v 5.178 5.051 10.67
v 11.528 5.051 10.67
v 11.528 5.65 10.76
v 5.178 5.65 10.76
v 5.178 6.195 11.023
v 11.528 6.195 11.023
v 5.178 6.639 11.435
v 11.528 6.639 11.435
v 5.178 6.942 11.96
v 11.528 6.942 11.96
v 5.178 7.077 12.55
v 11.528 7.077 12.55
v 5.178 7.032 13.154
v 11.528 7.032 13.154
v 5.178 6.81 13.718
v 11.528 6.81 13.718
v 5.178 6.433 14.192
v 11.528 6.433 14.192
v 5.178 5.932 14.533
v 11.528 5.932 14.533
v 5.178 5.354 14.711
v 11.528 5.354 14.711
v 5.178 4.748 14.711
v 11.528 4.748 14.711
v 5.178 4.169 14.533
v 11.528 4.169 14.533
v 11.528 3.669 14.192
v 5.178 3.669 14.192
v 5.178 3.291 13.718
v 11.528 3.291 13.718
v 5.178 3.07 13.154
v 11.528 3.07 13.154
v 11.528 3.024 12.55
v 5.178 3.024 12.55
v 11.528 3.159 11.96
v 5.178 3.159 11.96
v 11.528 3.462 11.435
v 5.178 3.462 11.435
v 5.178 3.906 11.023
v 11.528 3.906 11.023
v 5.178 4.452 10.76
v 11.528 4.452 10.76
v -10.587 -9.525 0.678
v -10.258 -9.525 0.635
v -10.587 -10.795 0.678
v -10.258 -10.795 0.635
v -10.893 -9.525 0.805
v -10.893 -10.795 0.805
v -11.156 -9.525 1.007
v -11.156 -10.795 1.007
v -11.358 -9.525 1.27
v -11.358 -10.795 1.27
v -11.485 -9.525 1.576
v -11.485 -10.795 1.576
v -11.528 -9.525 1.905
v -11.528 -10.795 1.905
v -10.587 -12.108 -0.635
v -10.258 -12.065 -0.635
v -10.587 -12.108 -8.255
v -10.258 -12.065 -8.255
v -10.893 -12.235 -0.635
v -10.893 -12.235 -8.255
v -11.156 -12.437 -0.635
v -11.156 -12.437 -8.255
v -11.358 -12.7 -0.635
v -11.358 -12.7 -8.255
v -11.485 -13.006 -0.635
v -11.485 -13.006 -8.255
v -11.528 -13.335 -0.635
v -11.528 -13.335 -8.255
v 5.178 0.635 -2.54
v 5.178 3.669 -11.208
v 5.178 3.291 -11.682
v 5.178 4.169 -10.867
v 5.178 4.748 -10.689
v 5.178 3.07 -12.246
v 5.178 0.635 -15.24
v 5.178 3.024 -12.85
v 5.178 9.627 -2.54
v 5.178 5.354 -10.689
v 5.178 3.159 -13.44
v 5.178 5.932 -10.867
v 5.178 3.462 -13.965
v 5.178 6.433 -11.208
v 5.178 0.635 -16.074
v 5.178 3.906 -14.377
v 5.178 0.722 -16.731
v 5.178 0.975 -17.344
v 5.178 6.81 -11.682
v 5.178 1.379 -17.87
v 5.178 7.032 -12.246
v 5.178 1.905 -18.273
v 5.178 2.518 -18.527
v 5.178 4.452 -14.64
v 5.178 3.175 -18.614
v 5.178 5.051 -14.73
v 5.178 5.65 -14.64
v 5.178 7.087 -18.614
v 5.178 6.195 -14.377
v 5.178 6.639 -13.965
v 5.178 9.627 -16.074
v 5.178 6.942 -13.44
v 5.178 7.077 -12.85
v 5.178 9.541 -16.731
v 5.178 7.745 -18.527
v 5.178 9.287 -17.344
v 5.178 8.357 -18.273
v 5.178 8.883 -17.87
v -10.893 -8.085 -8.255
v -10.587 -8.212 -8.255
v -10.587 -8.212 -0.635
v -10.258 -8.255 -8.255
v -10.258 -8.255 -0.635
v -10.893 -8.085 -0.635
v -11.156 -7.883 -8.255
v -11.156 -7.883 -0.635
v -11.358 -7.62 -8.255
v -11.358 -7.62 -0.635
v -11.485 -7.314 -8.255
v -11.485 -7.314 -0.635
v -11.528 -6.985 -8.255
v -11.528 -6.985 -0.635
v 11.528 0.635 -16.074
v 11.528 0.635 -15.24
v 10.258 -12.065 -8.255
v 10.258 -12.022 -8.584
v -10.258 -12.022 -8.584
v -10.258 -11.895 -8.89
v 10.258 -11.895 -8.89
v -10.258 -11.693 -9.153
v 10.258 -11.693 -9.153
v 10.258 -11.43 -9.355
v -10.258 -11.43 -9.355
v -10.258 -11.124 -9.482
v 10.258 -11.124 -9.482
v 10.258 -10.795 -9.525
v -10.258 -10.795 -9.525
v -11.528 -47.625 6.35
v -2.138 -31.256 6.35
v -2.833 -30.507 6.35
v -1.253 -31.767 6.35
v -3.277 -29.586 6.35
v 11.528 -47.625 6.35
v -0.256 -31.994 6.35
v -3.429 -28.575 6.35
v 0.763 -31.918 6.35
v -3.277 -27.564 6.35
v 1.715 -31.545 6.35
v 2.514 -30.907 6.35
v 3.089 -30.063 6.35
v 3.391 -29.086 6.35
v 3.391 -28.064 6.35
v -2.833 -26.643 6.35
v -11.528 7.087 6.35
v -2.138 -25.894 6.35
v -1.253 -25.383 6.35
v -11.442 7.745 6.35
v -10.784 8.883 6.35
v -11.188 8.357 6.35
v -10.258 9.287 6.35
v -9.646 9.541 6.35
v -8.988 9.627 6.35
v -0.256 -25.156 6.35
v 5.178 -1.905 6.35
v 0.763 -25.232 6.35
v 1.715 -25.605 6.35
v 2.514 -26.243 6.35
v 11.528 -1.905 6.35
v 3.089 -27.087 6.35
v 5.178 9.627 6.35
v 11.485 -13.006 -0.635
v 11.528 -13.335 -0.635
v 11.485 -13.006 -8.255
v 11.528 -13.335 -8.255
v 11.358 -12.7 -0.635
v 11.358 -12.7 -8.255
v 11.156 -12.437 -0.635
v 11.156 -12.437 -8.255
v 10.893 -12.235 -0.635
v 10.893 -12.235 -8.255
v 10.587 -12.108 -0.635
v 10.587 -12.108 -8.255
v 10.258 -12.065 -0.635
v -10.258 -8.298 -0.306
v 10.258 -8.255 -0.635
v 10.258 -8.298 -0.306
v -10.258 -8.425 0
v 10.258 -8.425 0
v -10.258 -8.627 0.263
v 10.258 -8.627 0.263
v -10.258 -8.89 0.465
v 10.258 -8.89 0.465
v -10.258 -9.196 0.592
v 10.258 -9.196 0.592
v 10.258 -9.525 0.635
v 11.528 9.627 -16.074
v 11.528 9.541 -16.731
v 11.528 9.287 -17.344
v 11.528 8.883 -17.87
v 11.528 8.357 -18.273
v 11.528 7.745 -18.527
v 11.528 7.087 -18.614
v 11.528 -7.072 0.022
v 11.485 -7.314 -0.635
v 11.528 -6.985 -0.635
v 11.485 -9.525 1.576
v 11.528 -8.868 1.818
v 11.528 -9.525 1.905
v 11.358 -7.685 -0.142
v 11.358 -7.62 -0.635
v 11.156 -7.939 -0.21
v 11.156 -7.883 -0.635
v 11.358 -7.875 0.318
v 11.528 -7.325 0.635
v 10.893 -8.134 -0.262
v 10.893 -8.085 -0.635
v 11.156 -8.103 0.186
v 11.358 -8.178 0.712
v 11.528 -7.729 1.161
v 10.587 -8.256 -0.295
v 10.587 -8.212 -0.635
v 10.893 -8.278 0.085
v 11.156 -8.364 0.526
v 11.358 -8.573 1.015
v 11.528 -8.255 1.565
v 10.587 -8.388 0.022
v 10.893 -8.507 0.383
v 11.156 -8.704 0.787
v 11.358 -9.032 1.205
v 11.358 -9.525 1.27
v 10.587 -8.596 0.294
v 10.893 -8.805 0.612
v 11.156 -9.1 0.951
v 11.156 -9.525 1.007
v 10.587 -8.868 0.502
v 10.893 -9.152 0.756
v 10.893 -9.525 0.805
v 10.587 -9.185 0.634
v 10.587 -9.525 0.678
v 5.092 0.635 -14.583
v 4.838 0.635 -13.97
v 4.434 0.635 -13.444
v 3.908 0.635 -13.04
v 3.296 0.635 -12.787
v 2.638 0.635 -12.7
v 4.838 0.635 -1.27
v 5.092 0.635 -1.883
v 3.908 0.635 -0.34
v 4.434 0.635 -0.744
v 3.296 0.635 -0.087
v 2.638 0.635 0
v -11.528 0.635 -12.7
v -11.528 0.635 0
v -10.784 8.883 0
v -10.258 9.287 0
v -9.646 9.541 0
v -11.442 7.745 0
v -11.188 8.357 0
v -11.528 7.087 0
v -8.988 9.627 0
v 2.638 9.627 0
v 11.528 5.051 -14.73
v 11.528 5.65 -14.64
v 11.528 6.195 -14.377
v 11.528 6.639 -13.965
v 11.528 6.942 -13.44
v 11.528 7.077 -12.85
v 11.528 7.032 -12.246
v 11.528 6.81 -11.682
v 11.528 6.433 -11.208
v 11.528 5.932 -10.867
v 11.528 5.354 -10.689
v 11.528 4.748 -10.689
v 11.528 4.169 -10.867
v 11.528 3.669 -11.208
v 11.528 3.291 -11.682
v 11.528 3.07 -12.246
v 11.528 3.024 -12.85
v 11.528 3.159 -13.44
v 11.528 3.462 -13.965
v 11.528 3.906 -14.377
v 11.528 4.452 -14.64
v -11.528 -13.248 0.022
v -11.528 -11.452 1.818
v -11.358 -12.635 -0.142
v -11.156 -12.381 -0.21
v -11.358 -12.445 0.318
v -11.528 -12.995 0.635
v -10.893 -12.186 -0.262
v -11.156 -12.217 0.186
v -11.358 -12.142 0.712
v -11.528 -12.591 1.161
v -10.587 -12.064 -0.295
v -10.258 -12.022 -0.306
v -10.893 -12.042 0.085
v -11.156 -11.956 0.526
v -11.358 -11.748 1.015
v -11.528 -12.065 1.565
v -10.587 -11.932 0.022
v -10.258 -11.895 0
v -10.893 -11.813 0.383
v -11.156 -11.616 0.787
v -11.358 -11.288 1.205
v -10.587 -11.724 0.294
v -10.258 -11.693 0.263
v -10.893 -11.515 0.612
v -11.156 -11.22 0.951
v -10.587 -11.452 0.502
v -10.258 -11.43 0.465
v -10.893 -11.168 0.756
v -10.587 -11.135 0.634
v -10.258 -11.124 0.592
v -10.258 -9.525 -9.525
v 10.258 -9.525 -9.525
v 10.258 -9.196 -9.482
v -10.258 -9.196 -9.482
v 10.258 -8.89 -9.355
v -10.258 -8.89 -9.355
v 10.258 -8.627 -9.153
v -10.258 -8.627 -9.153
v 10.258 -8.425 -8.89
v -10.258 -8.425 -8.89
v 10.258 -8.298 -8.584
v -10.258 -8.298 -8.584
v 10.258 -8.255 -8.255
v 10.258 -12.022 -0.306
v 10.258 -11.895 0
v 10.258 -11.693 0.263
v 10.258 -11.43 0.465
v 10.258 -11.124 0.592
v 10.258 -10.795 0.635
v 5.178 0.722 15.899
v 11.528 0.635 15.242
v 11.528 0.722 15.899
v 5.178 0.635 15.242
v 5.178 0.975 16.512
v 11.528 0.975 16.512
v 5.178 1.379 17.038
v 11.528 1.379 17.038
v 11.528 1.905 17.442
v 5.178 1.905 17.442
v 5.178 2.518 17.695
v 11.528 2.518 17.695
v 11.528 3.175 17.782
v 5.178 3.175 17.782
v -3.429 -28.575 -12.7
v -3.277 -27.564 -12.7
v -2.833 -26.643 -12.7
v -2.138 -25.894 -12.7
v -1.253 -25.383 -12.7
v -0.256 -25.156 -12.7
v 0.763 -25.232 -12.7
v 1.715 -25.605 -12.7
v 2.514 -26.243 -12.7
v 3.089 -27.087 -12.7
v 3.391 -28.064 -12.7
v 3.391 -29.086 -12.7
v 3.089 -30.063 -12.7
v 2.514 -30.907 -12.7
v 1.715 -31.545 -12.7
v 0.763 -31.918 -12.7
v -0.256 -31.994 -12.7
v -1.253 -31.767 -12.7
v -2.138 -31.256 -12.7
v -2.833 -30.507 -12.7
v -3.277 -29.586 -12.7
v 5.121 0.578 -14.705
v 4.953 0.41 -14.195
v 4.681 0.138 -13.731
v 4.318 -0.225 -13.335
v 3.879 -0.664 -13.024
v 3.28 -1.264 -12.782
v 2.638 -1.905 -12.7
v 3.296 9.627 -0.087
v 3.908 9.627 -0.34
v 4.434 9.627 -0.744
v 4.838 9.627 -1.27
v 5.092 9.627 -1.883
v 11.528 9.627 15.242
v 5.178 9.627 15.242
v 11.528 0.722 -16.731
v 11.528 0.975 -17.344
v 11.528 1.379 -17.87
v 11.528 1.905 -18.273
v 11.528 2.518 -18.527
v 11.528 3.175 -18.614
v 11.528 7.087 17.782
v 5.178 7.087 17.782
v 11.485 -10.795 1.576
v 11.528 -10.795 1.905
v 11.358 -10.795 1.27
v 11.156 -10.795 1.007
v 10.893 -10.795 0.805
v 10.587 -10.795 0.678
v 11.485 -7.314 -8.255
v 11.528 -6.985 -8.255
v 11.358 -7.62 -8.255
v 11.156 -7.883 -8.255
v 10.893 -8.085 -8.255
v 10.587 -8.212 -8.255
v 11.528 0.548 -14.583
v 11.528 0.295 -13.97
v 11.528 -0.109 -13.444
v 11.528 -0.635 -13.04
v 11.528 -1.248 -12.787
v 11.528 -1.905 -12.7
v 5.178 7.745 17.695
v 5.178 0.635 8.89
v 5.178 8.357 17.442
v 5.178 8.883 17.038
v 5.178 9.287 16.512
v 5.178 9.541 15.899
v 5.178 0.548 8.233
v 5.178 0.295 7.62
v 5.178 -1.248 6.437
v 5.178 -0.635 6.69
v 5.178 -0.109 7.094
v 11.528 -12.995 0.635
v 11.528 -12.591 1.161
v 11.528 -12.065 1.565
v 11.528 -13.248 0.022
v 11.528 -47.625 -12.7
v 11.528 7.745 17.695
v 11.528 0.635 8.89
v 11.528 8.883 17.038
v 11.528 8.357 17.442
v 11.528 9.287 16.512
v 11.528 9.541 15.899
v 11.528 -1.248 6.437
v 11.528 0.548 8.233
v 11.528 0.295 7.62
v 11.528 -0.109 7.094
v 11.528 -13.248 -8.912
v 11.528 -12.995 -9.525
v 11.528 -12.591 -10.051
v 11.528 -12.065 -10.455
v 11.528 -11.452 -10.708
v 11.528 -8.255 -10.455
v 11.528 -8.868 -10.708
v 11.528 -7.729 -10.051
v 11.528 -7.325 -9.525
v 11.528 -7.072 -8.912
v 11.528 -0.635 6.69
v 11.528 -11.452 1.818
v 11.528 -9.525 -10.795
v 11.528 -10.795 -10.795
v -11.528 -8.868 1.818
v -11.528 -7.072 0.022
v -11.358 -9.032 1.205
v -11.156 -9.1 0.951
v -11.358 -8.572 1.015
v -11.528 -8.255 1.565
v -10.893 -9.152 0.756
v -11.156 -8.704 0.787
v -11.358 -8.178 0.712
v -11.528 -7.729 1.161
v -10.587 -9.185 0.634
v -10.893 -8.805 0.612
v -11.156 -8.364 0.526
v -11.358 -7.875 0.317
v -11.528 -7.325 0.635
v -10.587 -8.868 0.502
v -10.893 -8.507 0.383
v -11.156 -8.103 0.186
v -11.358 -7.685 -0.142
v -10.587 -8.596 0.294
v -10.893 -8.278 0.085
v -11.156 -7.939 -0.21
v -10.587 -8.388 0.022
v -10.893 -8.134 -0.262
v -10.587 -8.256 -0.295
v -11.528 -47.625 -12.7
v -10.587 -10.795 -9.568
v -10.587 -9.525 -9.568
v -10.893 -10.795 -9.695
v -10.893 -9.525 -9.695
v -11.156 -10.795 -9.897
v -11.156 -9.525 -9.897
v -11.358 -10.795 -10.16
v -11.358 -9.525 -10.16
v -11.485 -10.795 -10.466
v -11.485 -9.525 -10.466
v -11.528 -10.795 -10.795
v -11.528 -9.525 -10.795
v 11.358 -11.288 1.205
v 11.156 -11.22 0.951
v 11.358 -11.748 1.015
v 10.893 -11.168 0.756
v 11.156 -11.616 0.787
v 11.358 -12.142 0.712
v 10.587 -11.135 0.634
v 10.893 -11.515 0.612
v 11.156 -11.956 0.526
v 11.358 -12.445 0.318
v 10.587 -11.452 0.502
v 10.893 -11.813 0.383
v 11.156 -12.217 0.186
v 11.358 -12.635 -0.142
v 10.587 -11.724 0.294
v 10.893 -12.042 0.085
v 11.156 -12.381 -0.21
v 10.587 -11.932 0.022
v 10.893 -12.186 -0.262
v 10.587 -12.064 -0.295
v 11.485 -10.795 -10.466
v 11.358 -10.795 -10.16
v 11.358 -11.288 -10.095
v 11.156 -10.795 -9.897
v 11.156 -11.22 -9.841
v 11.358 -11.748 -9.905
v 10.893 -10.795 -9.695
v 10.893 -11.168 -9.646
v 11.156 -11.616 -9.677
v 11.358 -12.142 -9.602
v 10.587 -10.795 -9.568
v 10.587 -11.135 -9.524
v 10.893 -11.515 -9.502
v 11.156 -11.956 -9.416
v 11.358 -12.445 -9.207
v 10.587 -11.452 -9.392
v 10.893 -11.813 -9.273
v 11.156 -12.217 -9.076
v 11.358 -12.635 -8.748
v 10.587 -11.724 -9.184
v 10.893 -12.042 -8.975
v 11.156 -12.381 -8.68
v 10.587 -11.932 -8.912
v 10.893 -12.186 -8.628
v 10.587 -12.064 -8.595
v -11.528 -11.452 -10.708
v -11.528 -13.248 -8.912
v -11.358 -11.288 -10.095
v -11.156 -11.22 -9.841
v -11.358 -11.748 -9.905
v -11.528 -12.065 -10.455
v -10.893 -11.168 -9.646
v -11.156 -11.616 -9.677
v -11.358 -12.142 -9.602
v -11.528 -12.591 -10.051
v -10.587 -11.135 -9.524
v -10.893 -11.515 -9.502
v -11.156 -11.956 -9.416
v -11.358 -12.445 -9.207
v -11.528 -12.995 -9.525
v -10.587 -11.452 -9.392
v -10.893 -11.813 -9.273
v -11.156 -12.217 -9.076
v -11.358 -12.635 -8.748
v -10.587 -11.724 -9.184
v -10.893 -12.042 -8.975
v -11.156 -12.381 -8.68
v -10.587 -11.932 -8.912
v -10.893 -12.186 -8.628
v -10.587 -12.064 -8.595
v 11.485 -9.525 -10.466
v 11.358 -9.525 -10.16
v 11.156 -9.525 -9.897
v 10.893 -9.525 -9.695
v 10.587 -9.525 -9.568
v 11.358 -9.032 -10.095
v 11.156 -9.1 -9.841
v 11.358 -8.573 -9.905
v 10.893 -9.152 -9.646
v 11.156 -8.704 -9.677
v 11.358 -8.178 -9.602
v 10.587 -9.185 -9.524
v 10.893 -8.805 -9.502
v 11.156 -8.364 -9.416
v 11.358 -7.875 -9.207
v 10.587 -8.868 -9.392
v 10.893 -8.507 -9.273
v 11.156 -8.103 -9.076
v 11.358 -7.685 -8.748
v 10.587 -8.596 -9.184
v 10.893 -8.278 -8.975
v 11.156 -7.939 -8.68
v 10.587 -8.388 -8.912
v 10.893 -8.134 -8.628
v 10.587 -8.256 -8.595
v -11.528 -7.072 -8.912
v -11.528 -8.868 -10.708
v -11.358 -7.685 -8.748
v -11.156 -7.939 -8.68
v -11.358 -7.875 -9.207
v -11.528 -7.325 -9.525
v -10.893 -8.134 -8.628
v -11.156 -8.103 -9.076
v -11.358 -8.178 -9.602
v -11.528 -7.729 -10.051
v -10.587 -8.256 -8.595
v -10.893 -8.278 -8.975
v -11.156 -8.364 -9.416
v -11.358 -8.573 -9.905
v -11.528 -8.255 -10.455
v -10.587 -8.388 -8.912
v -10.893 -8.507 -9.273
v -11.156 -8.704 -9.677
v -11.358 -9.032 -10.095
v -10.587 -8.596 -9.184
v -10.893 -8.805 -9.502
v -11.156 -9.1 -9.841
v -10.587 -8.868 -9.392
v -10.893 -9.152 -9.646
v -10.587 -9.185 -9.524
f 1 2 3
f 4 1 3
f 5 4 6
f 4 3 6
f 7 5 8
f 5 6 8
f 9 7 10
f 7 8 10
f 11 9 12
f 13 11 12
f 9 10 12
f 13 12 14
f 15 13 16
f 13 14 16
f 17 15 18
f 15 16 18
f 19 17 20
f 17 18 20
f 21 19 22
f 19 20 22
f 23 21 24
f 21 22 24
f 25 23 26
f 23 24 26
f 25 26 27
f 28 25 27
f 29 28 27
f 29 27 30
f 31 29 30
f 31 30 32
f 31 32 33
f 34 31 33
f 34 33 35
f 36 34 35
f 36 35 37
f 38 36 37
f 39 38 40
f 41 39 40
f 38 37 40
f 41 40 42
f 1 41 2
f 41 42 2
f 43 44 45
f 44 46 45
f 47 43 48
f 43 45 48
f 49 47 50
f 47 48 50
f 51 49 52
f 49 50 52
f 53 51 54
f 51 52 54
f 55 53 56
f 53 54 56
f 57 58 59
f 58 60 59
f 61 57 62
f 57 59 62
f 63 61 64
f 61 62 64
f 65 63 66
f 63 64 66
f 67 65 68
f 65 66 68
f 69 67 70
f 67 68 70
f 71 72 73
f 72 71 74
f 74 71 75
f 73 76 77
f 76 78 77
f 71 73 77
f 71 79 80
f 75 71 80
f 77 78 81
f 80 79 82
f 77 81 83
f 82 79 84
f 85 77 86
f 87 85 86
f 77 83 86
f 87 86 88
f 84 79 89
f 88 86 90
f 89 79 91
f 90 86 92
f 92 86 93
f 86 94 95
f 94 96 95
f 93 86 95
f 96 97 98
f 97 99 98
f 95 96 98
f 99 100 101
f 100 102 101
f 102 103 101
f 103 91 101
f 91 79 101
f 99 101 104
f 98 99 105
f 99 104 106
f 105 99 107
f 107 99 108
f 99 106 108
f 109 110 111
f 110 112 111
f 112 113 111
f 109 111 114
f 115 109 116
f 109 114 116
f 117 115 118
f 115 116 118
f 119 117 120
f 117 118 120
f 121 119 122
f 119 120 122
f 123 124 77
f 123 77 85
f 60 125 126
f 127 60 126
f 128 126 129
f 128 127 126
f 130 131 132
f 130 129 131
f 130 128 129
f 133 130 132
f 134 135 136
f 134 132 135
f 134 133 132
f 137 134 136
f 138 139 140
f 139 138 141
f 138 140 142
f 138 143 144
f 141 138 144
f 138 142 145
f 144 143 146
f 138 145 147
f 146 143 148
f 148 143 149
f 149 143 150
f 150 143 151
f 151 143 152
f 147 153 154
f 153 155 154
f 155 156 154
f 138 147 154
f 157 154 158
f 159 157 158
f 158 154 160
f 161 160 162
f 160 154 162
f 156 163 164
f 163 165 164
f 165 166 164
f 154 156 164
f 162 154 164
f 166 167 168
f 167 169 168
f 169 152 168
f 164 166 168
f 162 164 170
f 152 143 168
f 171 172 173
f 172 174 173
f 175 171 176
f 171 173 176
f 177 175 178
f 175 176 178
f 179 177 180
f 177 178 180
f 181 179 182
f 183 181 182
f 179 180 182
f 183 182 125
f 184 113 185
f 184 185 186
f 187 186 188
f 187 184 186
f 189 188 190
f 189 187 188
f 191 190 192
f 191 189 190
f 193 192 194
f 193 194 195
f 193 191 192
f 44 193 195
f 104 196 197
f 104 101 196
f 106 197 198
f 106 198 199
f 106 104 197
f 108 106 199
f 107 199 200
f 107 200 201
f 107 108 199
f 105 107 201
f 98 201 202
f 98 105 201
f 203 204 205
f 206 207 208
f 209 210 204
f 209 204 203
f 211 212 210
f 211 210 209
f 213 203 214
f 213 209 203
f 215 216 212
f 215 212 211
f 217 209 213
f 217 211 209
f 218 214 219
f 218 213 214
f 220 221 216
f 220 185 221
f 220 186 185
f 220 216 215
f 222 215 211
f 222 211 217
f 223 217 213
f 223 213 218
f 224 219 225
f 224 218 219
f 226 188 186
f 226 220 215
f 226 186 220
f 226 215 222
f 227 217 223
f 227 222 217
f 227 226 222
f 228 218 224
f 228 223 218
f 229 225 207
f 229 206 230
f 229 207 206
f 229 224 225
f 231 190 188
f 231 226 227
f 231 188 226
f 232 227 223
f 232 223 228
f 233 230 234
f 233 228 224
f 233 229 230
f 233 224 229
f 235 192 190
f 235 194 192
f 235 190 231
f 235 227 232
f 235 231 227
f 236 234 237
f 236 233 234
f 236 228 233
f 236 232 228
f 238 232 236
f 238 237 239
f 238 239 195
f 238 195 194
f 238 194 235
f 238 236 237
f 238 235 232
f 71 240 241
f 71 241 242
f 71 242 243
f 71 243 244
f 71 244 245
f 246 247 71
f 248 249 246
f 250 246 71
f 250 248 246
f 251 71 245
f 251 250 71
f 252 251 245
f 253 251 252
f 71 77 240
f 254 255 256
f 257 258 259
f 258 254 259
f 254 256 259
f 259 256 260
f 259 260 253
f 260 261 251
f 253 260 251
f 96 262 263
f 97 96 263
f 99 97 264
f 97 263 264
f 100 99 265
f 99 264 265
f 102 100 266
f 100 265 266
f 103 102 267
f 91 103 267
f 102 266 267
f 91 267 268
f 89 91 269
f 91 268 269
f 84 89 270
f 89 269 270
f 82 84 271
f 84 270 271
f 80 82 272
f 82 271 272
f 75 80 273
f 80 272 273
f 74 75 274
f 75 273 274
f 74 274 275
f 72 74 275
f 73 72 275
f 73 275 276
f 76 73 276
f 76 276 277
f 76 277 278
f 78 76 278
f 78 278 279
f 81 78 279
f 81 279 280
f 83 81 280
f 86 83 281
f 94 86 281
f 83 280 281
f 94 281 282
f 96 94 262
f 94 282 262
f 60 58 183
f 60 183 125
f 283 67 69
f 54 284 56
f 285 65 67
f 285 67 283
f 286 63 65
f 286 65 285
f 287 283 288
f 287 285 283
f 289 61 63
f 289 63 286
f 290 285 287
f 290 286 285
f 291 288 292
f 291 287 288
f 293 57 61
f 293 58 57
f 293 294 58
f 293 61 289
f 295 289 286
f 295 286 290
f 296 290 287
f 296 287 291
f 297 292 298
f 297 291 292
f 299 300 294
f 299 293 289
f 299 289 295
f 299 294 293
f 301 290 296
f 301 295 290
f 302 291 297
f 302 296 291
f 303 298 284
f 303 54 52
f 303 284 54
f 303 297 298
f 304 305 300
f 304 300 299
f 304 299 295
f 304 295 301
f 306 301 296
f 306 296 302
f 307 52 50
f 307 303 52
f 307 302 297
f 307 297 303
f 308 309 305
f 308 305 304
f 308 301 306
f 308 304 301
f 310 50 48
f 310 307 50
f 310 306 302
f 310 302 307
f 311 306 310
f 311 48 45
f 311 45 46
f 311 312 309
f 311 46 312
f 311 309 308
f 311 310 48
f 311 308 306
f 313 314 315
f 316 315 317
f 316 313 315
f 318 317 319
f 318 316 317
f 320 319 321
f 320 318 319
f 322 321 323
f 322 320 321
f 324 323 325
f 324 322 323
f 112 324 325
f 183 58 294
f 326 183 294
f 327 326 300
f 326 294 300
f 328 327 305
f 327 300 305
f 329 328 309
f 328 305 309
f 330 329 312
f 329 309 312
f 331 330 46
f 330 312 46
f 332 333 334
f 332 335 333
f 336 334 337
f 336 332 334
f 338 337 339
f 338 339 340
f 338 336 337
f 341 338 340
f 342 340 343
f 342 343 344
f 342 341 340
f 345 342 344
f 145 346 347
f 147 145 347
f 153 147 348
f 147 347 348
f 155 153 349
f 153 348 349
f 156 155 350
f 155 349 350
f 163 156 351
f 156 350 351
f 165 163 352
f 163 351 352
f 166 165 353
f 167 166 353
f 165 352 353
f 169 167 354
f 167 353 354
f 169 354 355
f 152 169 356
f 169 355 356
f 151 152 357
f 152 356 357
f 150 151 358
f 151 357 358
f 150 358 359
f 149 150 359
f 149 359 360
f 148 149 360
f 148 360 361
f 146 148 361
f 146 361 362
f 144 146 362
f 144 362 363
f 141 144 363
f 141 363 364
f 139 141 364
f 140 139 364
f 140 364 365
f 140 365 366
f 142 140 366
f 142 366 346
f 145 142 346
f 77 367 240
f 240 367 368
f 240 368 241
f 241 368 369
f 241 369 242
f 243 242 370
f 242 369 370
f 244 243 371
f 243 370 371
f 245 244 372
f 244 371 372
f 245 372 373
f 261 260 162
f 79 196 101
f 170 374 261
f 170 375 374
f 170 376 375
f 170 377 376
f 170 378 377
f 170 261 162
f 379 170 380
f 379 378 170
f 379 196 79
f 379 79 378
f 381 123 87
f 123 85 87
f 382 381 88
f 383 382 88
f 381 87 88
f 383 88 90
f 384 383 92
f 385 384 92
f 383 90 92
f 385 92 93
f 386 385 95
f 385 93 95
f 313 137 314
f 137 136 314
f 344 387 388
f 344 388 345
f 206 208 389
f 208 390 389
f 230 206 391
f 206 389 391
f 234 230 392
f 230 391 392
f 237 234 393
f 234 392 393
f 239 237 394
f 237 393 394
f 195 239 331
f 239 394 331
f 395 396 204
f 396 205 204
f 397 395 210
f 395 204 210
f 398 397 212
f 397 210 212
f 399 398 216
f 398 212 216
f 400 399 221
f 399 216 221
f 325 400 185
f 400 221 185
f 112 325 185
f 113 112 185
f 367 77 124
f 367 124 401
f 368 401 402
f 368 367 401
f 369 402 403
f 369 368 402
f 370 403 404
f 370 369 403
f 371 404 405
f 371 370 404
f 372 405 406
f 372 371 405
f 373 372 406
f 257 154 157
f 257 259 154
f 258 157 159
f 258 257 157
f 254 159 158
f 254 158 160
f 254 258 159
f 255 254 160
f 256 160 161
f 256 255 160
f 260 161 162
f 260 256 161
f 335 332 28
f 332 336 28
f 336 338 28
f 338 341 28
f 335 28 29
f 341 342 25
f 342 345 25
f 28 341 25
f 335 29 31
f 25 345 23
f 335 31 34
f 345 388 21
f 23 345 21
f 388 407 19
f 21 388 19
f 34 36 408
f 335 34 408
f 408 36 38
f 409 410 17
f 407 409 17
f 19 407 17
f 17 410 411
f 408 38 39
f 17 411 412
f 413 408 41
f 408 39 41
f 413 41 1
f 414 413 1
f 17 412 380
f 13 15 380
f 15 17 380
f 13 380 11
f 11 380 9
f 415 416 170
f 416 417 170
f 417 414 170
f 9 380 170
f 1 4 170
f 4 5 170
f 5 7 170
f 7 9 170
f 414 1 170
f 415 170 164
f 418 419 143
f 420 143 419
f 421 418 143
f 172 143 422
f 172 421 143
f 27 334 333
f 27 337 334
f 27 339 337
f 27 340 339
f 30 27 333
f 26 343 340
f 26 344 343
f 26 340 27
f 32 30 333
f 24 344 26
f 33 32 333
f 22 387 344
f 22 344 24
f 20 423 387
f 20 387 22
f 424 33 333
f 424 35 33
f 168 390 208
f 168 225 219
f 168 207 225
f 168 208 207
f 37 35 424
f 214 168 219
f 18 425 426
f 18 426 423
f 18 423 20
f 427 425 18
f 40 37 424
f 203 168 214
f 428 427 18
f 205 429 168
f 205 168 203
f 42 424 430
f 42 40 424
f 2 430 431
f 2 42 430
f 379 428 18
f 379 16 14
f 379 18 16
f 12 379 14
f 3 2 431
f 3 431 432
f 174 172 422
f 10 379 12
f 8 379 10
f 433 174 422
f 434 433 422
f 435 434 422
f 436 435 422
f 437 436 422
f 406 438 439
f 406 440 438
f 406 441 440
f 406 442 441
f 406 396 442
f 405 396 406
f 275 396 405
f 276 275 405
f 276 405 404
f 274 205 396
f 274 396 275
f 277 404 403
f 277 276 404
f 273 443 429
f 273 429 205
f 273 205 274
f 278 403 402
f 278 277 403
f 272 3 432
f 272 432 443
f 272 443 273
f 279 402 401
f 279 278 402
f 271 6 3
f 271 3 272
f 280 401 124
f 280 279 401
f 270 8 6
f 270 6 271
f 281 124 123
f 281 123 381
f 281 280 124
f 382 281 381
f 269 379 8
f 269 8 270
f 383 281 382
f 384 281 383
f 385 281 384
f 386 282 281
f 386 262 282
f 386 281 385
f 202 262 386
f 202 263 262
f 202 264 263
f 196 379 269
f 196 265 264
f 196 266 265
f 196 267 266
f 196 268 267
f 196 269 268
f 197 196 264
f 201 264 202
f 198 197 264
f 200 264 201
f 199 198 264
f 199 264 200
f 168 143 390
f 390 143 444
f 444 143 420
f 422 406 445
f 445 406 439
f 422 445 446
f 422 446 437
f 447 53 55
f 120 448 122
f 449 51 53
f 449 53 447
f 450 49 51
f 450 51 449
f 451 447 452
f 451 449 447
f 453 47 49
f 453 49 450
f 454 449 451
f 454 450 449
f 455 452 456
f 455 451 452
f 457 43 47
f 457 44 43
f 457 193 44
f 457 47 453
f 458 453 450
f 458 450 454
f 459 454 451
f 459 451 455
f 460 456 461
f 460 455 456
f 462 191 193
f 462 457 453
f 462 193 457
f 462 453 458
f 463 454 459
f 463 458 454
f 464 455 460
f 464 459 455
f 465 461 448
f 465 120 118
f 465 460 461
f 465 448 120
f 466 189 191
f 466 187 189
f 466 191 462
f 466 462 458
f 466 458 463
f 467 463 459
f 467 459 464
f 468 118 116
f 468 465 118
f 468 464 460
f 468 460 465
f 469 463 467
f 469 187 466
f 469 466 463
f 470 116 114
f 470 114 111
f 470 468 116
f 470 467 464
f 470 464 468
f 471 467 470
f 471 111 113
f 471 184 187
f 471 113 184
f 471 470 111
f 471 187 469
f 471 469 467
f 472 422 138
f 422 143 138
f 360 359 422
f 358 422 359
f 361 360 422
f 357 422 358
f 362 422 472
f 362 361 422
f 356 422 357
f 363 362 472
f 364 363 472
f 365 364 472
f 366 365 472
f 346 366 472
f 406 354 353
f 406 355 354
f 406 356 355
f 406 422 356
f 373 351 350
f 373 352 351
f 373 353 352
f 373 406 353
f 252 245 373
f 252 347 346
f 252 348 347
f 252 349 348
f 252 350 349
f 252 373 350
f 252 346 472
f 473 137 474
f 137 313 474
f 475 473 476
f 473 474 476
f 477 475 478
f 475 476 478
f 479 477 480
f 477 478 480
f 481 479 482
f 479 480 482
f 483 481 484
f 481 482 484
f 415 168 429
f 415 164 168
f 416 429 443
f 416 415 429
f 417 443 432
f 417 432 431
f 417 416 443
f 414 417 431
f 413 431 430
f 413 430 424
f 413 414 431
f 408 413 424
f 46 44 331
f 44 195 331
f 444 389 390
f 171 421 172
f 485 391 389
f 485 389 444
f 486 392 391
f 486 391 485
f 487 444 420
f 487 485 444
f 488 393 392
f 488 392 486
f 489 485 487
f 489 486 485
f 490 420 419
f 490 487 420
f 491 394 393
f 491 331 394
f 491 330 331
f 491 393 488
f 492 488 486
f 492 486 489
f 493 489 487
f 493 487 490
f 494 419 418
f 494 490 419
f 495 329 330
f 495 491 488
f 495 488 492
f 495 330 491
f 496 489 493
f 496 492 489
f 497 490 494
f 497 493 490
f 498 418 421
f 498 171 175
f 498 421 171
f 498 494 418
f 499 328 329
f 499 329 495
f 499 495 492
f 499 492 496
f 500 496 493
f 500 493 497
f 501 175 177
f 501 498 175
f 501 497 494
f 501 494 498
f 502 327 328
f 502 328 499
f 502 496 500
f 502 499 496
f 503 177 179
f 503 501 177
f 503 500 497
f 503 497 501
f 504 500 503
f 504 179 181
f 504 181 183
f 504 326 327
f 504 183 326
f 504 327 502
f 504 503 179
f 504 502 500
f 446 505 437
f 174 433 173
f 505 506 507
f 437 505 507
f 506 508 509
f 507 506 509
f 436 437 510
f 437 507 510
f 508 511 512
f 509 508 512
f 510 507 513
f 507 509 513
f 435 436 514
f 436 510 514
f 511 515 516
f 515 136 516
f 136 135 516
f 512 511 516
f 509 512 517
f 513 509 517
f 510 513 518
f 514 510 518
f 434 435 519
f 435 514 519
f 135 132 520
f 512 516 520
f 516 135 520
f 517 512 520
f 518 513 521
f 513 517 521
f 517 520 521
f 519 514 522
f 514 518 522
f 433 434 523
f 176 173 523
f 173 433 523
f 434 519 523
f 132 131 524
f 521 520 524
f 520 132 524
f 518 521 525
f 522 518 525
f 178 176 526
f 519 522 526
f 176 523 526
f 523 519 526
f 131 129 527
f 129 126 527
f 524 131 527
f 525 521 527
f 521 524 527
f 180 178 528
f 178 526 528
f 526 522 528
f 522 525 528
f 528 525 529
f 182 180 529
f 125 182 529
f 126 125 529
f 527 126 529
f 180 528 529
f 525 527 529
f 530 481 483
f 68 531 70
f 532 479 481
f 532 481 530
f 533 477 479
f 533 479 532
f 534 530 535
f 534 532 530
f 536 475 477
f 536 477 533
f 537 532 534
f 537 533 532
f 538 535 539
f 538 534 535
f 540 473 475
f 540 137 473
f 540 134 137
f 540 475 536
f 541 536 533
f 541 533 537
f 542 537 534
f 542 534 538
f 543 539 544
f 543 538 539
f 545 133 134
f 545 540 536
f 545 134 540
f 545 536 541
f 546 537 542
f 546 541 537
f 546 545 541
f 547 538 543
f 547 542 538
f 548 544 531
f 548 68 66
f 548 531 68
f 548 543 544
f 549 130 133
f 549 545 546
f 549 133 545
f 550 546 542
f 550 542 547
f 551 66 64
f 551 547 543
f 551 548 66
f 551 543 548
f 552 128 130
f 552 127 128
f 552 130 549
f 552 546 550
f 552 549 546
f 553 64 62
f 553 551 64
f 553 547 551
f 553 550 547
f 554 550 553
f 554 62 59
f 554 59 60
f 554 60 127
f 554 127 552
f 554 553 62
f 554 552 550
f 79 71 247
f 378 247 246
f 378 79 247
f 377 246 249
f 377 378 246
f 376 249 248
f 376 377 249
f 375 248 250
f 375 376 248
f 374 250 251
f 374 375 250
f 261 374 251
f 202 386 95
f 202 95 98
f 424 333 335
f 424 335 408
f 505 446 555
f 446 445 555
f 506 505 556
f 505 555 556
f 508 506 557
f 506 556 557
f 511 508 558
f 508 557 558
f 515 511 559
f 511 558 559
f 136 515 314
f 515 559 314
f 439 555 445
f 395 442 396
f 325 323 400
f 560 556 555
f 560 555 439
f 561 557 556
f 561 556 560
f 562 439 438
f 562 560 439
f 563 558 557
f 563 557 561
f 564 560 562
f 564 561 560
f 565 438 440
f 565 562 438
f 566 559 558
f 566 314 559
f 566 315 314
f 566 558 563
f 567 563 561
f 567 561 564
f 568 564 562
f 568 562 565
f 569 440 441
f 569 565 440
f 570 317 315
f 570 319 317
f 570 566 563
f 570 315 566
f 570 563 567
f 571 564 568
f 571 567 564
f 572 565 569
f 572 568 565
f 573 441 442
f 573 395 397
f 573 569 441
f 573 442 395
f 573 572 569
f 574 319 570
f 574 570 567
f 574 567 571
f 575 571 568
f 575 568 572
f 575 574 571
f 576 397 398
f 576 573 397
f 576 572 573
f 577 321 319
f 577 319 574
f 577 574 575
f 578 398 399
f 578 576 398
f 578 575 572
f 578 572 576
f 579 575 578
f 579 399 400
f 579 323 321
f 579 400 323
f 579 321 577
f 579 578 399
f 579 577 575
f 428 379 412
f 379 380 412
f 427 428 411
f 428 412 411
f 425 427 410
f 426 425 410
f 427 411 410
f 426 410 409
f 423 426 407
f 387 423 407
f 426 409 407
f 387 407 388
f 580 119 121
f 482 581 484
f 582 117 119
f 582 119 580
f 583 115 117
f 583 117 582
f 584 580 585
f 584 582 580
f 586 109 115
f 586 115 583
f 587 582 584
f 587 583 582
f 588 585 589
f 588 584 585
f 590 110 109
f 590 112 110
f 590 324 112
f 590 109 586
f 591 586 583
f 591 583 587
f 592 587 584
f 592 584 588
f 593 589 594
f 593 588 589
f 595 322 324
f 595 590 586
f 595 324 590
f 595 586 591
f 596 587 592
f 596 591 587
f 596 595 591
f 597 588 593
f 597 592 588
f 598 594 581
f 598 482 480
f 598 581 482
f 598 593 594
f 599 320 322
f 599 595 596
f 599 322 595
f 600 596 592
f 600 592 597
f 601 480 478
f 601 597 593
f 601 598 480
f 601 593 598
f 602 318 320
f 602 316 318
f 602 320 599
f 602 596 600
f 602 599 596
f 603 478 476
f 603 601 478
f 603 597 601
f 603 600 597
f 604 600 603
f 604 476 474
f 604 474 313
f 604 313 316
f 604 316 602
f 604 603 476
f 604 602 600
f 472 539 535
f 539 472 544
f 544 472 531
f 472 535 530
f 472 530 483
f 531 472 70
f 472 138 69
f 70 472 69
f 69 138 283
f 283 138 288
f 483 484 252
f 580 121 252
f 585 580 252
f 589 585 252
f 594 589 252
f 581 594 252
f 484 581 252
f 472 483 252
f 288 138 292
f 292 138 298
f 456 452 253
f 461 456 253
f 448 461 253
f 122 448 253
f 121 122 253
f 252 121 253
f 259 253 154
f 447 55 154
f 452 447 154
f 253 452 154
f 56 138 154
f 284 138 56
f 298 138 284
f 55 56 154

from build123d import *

# Parameters (mm, degrees)
SKETCH1_W           = 23.056445047489827
SKETCH1_H           = 95.25
SKETCH1_R           = 1.2700000000000005
SKETCH1_R_2         = 1.269999999999998
BOSS_EXTRUDE1_DEPTH = 6.35
SKETCH2_W           = 23.056445047489827
SKETCH2_H           = 48.26
BOSS_EXTRUDE2_DEPTH = 12.7
CUT_EXTRUDE2_DEPTH  = 55.41534970233967
SKETCH6_R           = 3.4289999999999994
CUT_EXTRUDE3_DEPTH  = 53.57321599024526
FILLET2_R           = 1.27
BOSS_EXTRUDE3_DEPTH = 6.35
SKETCH9_R           = 1.9049999999999996
SKETCH9_R_2         = 1.905
CUT_EXTRUDE4_DEPTH  = 53.43149307056342
FILLET4_R           = 2.54
BOSS_EXTRUDE7_DEPTH = 6.35
FILLET5_R           = 2.54
FILLET6_R           = 2.54
SKETCH13_R          = 2.0319999999999987
SKETCH13_R_2        = 2.032000000000001
CUT_EXTRUDE5_DEPTH  = 6.35
FILLET7_R           = 2.54
SKETCH14_W          = 8.8077942060624
SKETCH14_H          = 39.07493764297598
CUT_EXTRUDE6_DEPTH  = 45.21200000000002
SKETCH15_W          = 6.35
SKETCH15_H          = 6.35
CUT_EXTRUDE7_DEPTH  = 7.112000000000007
FILLET8_R           = 2.54


with BuildPart() as part:
    # Sketch1 → Boss-Extrude1 (new body)
    # profile 1 of 4: a face of its own
    with BuildSketch(Plane.XY):
        Rectangle(SKETCH1_W, SKETCH1_H)
        Polygon((7.9121000000000015, 16.687800000000006), (7.9121000000000015, 44.449999999999996), (-7.912099999999998, 44.45), (-7.912099999999998, 16.687800000000006), align=None, mode=Mode.SUBTRACT)
    # profile 2 of 4: a face of its own
    with BuildSketch(Plane.XY):
        Polygon((-7.912099999999998, 16.687800000000006), (7.9121000000000015, 16.687800000000006), (7.9121000000000015, 44.449999999999996), (-7.912099999999998, 44.45), align=None)
        with Locations((5.372100000000001, 19.227800000000006)):
            Circle(SKETCH1_R, mode=Mode.SUBTRACT)
        with Locations((-5.372099999999998, 41.910000000000004)):
            Circle(SKETCH1_R_2, mode=Mode.SUBTRACT)
    # profile 3 of 4: a face of its own
    with BuildSketch(Plane.XY):
        with Locations((-5.372099999999998, 41.910000000000004)):
            Circle(SKETCH1_R_2)
    # profile 4 of 4: a face of its own
    with BuildSketch(Plane.XY):
        with Locations((5.372100000000001, 19.227800000000006)):
            Circle(SKETCH1_R)
    extrude(amount=BOSS_EXTRUDE1_DEPTH)

    # Sketch2 → Boss-Extrude2 (add)
    with BuildSketch(Plane(origin=(0, 0, 0), x_dir=(-1, 0, 0), z_dir=(0, 0, -1))):
        with Locations((0, -23.495)):
            Rectangle(SKETCH2_W, SKETCH2_H)
    extrude(amount=BOSS_EXTRUDE2_DEPTH)

    # Sketch5 → Cut-Extrude2 (cut, through all)
    with BuildSketch(Plane(origin=(11.528222523744914, 0, 0), x_dir=(0, 0, -1), z_dir=(1, 0, 0))):
        Polygon((-0.6350000000000019, -12.065000000000001), (9.524999999999997, -12.065000000000001), (9.524999999999999, -8.255000000000003), (-0.6350000000000019, -8.255000000000003), align=None)
    extrude(amount=-CUT_EXTRUDE2_DEPTH, mode=Mode.SUBTRACT)

    # Sketch6 → Cut-Extrude3 (cut, through all)
    with BuildSketch(Plane(origin=(0, 0, -12.7), x_dir=(-1, 0, 0), z_dir=(0, 0, -1))):
        with Locations((0, -28.575)):
            Circle(SKETCH6_R)
    extrude(amount=-CUT_EXTRUDE3_DEPTH, mode=Mode.SUBTRACT)

    # Fillet2
    fillet2_edges = [part.edges().sort_by_distance(p)[0] for p in [
        (-11.528222523744914, -10.160000000000004, -9.524999999999999),
        (0, -8.255000000000003, -9.524999999999999),
        (-11.528222523744914, -12.065, -4.444999999999998),
        (0, -12.065000000000001, -9.524999999999997),
        (-11.528222523744914, -10.16, 0.6350000000000019),
        (0, -12.065000000000001, 0.6350000000000019),
        (-11.528222523744914, -8.255000000000003, -4.4449999999999985),
        (0, -8.255000000000003, 0.6350000000000019),
        (11.528222523744914, -10.160000000000002, -9.524999999999999),
        (11.528222523744914, -8.255000000000003, -4.4449999999999985),
        (11.528222523744914, -10.160000000000002, 0.6350000000000019),
        (11.528222523744914, -12.065000000000001, -4.444999999999998),
    ]]
    fillet(fillet2_edges, radius=FILLET2_R)

    # Sketch8 → Boss-Extrude3 (add)
    with BuildSketch(Plane.ZY.offset(11.528222523744914)):
        Polygon((6.35, 47.625), (-1.21e-15, 47.625), (0, 6.98625472546675), (6.350000000000005, 6.986254725466751), align=None)
    extrude(amount=BOSS_EXTRUDE3_DEPTH)

    # Sketch9 → Cut-Extrude4 (cut, through all)
    with BuildSketch(Plane.XY):
        with Locations((-4.594022523744915, 12.877800000000006)):
            Circle(SKETCH9_R)
        with Locations((-15.338222523744914, 35.56)):
            Circle(SKETCH9_R_2)
    extrude(amount=CUT_EXTRUDE4_DEPTH, mode=Mode.SUBTRACT)

    # Fillet4
    fillet4_edges = [part.edges().sort_by_distance(p)[0] for p in [
        (11.528222523744914, 47.625, 3.175),
        (-17.878222523744913, 47.625, 3.1749999999999994),
    ]]
    fillet(fillet4_edges, radius=FILLET4_R)

    # Sketch12 → Boss-Extrude7 (add)
    with BuildSketch(Plane(origin=(11.528222523744914, 0, 0), x_dir=(0, 0, -1), z_dir=(1, 0, 0))):
        Polygon((-6.35, 0.6349999999999898), (18.613653389650153, 0.6349999999999898), (18.613653389650153, 9.627193152709879), (-17.78195834691587, 9.627193152709879), (-17.78195834691587, 0.6349999999999898), align=None)
    extrude(amount=-BOSS_EXTRUDE7_DEPTH)

    # Fillet5
    fillet5_edges = [part.edges().sort_by_distance(p)[0] for p in [
        (8.353222523744913, 0.6349999999999967, -12.7),
        (5.178222523744914, 5.131096576354938, 0),
        (8.353222523744915, 0.6349999999999898, 6.35),
    ]]
    fillet(fillet5_edges, radius=FILLET5_R)

    # Fillet6
    fillet6_edges = [part.edges().sort_by_distance(p)[0] for p in [
        (5.178222523744914, -0.6350000000000069, -12.7),
    ]]
    fillet(fillet6_edges, radius=FILLET6_R)

    # Sketch13 → Cut-Extrude5 (cut)
    with BuildSketch(Plane(origin=(11.528222523744914, 0, 0), x_dir=(0, 0, -1), z_dir=(1, 0, 0))):
        with Locations((-12.70195834691587, 5.050717249087455)):
            Circle(SKETCH13_R)
        with Locations((12.698041653084129, 5.050717249087455)):
            Circle(SKETCH13_R_2)
    extrude(amount=-CUT_EXTRUDE5_DEPTH, mode=Mode.SUBTRACT)

    # Fillet7
    fillet7_edges = [part.edges().sort_by_distance(p)[0] for p in [
        (8.353222523744915, 0.6349999999999898, -18.613653389650153),
        (8.353222523744915, 0.6349999999999898, 17.78195834691587),
        (8.353222523744915, 9.627193152709879, 17.78195834691587),
        (8.353222523744915, 9.627193152709879, -18.613653389650153),
    ]]
    fillet(fillet7_edges, radius=FILLET7_R)

    # Sketch14 → Cut-Extrude6 (cut)
    with BuildSketch(Plane(origin=(11.528222523744914, 0, 0), x_dir=(0, 0, -1), z_dir=(1, 0, 0))):
        with Locations((-1.9461028969687981, 29.16466197419787)):
            Rectangle(SKETCH14_W, SKETCH14_H)
    extrude(amount=-CUT_EXTRUDE6_DEPTH, mode=Mode.SUBTRACT)

    # Sketch15 → Cut-Extrude7 (cut)
    with BuildSketch(Plane.XZ.offset(-6.98625472546675)):
        with Locations((-14.703222523744913, 3.1750000000000007)):
            Rectangle(SKETCH15_W, SKETCH15_H)
    extrude(amount=-CUT_EXTRUDE7_DEPTH, mode=Mode.SUBTRACT)

    # Fillet8
    fillet8_edges = [part.edges().sort_by_distance(p)[0] for p in [
        (-11.528222523744914, 9.627193152709879, 3.1750000000000007),
    ]]
    fillet(fillet8_edges, radius=FILLET8_R)


solid = part.part
